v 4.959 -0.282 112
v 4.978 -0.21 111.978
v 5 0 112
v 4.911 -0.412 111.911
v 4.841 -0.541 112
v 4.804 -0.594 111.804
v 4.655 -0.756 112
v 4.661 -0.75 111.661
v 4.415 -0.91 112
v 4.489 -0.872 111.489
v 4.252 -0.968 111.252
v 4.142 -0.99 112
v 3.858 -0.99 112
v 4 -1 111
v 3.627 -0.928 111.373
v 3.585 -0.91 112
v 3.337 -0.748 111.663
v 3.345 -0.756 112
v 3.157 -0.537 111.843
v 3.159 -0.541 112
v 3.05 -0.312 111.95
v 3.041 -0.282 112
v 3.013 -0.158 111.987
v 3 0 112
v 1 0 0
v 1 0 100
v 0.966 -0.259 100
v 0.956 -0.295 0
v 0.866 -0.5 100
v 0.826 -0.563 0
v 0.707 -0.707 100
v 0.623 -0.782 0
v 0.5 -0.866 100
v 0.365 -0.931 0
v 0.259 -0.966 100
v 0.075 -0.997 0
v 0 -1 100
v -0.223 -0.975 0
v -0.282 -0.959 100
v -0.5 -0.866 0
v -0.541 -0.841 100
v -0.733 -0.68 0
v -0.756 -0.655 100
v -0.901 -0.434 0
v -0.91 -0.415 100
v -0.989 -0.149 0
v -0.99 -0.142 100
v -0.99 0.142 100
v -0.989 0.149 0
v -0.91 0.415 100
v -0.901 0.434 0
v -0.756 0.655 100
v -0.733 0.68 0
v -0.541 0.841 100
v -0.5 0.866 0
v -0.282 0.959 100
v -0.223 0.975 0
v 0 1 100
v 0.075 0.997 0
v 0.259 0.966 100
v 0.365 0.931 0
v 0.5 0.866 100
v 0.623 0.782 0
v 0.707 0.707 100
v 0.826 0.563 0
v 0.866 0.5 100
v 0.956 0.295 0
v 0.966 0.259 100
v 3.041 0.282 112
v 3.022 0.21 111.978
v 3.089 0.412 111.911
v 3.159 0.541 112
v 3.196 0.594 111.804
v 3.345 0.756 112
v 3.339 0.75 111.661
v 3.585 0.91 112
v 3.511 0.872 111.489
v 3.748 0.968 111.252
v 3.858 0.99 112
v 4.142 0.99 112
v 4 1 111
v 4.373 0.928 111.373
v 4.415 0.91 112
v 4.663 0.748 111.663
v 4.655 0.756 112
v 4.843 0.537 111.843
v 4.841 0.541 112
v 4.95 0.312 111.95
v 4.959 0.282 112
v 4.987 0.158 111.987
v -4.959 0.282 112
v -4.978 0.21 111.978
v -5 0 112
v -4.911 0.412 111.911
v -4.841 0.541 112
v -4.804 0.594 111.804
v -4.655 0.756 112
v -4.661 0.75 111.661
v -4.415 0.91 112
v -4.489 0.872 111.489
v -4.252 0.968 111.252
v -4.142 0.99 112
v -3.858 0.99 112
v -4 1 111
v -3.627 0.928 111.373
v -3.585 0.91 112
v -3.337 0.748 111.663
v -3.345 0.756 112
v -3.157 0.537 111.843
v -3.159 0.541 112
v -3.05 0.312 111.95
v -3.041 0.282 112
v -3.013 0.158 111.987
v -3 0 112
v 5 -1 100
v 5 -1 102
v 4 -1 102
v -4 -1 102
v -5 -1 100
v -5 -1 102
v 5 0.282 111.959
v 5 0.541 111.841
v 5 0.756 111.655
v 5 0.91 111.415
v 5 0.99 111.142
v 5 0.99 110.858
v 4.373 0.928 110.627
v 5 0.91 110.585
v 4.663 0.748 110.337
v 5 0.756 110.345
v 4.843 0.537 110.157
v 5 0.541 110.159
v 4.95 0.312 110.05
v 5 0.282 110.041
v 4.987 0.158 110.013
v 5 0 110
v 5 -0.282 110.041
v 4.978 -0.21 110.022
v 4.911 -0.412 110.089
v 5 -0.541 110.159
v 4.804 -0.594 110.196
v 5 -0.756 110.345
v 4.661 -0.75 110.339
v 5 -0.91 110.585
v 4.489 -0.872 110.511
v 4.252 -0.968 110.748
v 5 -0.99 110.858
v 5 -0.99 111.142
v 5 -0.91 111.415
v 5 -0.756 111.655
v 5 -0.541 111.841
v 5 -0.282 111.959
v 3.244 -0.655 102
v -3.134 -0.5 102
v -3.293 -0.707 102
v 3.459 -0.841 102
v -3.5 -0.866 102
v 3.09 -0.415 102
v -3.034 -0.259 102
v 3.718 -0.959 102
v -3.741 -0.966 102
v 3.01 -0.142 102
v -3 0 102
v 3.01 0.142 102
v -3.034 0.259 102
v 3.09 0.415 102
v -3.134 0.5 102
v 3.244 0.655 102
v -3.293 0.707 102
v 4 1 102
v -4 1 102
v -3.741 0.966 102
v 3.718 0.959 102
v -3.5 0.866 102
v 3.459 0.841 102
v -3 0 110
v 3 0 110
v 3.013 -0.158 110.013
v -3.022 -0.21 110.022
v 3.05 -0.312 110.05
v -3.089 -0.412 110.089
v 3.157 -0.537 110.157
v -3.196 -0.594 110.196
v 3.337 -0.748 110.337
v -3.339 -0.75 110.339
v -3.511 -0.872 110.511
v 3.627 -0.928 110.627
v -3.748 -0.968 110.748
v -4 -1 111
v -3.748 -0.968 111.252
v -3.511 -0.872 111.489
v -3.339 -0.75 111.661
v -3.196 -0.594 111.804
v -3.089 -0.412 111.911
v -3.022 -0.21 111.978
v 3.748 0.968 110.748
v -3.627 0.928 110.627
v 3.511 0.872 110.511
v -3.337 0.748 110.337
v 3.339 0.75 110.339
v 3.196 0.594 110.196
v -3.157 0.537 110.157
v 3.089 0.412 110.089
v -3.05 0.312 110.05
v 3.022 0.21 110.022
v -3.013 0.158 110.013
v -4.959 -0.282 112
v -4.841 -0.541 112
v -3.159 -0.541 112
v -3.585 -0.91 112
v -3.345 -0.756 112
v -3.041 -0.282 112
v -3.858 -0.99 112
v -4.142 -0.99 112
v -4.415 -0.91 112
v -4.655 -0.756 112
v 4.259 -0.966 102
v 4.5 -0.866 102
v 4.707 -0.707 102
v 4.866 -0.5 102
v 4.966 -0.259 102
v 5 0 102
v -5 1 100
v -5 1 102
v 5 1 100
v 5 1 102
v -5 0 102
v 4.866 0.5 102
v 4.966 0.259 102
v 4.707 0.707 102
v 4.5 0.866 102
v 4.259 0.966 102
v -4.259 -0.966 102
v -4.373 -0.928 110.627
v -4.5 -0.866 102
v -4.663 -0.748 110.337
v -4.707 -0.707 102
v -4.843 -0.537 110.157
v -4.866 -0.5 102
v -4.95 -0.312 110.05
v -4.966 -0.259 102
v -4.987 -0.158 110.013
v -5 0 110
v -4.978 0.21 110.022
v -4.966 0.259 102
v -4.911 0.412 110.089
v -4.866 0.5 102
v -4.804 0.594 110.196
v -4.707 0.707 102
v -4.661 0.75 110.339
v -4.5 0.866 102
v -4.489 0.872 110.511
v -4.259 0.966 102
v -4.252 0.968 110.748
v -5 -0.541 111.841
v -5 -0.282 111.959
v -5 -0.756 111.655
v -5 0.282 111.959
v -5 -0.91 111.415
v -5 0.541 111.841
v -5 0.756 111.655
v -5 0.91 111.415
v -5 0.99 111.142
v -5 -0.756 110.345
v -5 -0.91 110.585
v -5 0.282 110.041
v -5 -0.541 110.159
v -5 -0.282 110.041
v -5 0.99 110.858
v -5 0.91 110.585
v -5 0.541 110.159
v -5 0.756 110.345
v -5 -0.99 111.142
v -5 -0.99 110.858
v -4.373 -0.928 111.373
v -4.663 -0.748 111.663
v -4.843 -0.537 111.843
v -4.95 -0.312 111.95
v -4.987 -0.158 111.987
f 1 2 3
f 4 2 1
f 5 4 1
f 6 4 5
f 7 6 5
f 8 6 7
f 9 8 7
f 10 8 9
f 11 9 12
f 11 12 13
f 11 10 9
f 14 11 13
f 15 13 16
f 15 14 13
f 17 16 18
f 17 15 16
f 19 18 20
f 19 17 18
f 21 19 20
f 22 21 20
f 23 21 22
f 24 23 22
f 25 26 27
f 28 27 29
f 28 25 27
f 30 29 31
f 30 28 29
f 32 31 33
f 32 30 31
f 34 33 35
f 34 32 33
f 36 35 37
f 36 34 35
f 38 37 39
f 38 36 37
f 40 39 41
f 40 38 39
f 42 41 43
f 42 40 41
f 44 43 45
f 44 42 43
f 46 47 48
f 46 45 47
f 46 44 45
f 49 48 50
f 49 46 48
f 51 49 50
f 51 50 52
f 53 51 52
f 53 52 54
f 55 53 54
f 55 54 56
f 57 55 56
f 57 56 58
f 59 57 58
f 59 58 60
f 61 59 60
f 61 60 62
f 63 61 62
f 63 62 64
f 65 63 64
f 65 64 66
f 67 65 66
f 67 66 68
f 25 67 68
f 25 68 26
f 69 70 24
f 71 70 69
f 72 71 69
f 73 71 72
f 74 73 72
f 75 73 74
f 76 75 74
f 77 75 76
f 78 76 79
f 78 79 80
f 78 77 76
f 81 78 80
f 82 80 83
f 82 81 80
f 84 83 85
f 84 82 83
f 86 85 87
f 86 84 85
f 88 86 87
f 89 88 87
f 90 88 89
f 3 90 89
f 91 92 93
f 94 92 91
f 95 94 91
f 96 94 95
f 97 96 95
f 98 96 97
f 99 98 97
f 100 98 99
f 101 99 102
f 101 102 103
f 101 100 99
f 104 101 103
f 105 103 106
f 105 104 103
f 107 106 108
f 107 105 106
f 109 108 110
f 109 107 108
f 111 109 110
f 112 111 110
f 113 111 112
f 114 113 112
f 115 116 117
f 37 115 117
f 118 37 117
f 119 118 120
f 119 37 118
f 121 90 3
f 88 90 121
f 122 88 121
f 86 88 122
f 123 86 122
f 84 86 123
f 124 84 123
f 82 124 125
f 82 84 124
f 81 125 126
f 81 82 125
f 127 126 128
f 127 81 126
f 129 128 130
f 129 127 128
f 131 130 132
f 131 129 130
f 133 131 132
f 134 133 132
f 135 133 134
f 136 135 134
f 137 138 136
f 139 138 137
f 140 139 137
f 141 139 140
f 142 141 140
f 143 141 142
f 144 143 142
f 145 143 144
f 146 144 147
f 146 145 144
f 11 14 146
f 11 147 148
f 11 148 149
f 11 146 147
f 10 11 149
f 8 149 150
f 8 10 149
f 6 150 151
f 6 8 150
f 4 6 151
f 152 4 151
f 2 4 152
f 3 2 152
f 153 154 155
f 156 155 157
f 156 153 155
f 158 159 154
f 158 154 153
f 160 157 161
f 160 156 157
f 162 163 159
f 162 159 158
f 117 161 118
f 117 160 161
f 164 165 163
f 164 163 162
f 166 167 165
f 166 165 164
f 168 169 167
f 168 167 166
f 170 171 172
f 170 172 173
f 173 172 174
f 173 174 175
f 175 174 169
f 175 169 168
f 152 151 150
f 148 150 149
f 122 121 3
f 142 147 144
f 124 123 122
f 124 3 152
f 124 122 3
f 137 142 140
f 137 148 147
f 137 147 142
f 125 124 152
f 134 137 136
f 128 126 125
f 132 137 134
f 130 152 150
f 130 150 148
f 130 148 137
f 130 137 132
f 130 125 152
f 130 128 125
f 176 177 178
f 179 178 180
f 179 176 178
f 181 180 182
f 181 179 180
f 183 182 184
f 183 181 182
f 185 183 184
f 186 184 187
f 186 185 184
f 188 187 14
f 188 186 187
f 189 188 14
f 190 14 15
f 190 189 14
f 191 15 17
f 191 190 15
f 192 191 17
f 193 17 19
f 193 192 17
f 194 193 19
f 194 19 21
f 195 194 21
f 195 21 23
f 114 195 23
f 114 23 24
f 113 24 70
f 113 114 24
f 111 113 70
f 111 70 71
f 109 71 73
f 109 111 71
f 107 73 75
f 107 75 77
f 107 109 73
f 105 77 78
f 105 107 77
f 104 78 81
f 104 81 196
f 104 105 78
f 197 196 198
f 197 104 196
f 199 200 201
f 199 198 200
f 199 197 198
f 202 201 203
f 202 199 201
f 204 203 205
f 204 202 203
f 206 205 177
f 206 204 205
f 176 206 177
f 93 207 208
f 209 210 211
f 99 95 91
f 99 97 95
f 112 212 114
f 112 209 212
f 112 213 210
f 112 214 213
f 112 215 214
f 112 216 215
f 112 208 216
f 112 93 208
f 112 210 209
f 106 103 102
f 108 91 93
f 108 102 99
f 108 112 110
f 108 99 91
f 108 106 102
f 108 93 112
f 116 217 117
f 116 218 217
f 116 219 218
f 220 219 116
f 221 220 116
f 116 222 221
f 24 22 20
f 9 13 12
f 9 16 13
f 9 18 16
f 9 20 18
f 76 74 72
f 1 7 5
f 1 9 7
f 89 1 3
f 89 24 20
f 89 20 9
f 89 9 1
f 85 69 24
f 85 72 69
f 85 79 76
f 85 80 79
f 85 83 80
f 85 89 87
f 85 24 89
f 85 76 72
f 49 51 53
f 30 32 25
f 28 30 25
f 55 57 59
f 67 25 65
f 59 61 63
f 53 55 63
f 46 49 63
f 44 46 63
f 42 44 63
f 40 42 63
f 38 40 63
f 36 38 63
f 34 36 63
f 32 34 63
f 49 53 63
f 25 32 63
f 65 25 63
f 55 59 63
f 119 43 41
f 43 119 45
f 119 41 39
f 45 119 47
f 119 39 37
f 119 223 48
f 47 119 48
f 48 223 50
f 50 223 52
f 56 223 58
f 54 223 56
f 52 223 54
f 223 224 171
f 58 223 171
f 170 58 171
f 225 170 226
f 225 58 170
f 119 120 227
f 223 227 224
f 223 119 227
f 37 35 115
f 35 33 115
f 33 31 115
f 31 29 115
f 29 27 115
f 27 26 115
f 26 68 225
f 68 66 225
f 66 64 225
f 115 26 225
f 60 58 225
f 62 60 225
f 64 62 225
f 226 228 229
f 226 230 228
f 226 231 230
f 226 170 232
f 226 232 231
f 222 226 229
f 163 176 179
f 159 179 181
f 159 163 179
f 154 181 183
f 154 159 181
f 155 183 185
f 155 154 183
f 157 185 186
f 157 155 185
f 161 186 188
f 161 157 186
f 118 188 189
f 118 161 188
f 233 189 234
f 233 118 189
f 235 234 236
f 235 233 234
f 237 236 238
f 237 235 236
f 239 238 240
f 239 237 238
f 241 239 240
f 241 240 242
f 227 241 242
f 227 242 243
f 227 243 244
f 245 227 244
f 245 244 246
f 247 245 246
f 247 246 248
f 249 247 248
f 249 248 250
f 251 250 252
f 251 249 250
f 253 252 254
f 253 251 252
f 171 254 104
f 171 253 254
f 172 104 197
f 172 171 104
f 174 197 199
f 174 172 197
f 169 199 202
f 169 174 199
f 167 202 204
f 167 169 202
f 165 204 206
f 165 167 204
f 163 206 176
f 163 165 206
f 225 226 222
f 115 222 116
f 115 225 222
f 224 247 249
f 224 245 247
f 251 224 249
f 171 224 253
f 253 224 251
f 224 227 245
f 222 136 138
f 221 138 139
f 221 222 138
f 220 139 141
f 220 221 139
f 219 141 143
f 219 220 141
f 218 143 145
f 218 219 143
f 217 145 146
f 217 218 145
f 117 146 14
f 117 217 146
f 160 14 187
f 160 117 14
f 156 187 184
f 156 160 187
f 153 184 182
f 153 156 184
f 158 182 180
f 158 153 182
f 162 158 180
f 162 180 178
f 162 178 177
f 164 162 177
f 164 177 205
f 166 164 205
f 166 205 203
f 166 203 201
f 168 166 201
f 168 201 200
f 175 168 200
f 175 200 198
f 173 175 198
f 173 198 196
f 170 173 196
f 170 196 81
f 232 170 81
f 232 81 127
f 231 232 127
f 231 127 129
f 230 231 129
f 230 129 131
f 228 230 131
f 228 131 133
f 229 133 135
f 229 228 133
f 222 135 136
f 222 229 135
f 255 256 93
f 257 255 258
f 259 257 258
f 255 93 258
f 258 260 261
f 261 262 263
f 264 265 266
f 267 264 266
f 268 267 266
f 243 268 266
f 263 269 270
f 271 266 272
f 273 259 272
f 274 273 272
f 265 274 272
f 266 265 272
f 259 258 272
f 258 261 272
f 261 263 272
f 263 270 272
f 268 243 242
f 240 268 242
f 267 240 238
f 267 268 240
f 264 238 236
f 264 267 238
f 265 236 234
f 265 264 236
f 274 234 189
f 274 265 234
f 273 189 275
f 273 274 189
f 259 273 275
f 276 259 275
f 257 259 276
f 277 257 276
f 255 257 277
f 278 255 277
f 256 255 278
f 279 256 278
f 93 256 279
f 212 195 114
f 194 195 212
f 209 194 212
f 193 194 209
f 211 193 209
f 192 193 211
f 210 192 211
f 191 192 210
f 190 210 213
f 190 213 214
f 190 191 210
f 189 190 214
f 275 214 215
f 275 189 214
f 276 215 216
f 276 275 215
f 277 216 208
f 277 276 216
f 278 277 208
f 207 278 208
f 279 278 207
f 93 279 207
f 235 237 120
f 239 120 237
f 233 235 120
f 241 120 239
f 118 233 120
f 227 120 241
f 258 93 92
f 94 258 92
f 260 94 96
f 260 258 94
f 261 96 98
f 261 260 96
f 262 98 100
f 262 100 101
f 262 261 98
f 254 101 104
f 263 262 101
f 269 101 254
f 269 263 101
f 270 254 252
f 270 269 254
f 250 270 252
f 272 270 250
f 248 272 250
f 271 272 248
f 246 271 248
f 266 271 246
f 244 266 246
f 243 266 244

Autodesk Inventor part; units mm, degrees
ref_plane "YZ Plane" through (0, 0, 0) normal (1, 0, 0) x (0, 1, 0)
ref_plane "XZ Plane" through (0, 0, 0) normal (0, 1, 0) x (-1, 0, 0)
sketch "Náčrt1" plane through (0, 0, 0) normal (0, 0, 1) x (1, 0, 0)
  circle A0 centre (0, 0) radius 1
  dimension "d0" = 2
extrude "Vysunutí1" add sketch "Náčrt1" along normal blind 100
sketch "Náčrt2" plane through (0, 0, 100) normal (0, 0, 1) x (1, 0, 0)
  line L0 (-5, 1) -> (5, 1)
  line L1 (5, 1) -> (5, -1)
  line L2 (5, -1) -> (-5, -1)
  line L3 (-5, -1) -> (-5, 1)
  line L4 (-7, 0) -> (7, 0) projected
  line L5 (0, 1.4) -> (0, -1.4) projected
  point P0 (0, 0)
  dimension "d3" = 10
extrude "Vysunutí2" add sketch "Náčrt2" along normal blind 2
sketch "Náčrt3" plane through (0, 0, 102) normal (0, 0, 1) x (1, 0, 0)
  line L0 (-5, -1) -> (5, -1) projected
  line L1 (5, -1) -> (5, 1) projected
  line L2 (5, 1) -> (-5, 1) projected
  line L3 (-5, 1) -> (-5, -1) projected
  circle A0 centre (-4, 0) radius 1
  circle A1 centre (4, 0) radius 1
  point P0 (0, 0)
extrude "Vysunutí3" add sketch "Náčrt3" along normal blind 10 contours A0 | A1
ref_plane "Pracovní rovina1" through (-3, 0, 102) normal (1, 0, 0) x (0, 0, -1)
sketch "Náčrt4" plane through (-3, 0, 102) normal (1, 0, 0) x (0, 0, -1)
  line L0 (-10, 1) -> (-10, -1) projected
  line L1 (0, 1) -> (0, -1) projected
  line L2 (0, 0) -> (0, 1) projected
  line L3 (0, -1) -> (0, 0) projected
  line L4 (0, 1) -> (-10, 1) projected
  line L5 (0, -1) -> (-10, -1) projected
  circle A0 centre (-9, 0) radius 1
  point P0 (102, 0)
extrude "Vysunutí4" add sketch "Náčrt4" along normal blind 8 and the other way blind 2 contours A0
properties part number "táhlo"
